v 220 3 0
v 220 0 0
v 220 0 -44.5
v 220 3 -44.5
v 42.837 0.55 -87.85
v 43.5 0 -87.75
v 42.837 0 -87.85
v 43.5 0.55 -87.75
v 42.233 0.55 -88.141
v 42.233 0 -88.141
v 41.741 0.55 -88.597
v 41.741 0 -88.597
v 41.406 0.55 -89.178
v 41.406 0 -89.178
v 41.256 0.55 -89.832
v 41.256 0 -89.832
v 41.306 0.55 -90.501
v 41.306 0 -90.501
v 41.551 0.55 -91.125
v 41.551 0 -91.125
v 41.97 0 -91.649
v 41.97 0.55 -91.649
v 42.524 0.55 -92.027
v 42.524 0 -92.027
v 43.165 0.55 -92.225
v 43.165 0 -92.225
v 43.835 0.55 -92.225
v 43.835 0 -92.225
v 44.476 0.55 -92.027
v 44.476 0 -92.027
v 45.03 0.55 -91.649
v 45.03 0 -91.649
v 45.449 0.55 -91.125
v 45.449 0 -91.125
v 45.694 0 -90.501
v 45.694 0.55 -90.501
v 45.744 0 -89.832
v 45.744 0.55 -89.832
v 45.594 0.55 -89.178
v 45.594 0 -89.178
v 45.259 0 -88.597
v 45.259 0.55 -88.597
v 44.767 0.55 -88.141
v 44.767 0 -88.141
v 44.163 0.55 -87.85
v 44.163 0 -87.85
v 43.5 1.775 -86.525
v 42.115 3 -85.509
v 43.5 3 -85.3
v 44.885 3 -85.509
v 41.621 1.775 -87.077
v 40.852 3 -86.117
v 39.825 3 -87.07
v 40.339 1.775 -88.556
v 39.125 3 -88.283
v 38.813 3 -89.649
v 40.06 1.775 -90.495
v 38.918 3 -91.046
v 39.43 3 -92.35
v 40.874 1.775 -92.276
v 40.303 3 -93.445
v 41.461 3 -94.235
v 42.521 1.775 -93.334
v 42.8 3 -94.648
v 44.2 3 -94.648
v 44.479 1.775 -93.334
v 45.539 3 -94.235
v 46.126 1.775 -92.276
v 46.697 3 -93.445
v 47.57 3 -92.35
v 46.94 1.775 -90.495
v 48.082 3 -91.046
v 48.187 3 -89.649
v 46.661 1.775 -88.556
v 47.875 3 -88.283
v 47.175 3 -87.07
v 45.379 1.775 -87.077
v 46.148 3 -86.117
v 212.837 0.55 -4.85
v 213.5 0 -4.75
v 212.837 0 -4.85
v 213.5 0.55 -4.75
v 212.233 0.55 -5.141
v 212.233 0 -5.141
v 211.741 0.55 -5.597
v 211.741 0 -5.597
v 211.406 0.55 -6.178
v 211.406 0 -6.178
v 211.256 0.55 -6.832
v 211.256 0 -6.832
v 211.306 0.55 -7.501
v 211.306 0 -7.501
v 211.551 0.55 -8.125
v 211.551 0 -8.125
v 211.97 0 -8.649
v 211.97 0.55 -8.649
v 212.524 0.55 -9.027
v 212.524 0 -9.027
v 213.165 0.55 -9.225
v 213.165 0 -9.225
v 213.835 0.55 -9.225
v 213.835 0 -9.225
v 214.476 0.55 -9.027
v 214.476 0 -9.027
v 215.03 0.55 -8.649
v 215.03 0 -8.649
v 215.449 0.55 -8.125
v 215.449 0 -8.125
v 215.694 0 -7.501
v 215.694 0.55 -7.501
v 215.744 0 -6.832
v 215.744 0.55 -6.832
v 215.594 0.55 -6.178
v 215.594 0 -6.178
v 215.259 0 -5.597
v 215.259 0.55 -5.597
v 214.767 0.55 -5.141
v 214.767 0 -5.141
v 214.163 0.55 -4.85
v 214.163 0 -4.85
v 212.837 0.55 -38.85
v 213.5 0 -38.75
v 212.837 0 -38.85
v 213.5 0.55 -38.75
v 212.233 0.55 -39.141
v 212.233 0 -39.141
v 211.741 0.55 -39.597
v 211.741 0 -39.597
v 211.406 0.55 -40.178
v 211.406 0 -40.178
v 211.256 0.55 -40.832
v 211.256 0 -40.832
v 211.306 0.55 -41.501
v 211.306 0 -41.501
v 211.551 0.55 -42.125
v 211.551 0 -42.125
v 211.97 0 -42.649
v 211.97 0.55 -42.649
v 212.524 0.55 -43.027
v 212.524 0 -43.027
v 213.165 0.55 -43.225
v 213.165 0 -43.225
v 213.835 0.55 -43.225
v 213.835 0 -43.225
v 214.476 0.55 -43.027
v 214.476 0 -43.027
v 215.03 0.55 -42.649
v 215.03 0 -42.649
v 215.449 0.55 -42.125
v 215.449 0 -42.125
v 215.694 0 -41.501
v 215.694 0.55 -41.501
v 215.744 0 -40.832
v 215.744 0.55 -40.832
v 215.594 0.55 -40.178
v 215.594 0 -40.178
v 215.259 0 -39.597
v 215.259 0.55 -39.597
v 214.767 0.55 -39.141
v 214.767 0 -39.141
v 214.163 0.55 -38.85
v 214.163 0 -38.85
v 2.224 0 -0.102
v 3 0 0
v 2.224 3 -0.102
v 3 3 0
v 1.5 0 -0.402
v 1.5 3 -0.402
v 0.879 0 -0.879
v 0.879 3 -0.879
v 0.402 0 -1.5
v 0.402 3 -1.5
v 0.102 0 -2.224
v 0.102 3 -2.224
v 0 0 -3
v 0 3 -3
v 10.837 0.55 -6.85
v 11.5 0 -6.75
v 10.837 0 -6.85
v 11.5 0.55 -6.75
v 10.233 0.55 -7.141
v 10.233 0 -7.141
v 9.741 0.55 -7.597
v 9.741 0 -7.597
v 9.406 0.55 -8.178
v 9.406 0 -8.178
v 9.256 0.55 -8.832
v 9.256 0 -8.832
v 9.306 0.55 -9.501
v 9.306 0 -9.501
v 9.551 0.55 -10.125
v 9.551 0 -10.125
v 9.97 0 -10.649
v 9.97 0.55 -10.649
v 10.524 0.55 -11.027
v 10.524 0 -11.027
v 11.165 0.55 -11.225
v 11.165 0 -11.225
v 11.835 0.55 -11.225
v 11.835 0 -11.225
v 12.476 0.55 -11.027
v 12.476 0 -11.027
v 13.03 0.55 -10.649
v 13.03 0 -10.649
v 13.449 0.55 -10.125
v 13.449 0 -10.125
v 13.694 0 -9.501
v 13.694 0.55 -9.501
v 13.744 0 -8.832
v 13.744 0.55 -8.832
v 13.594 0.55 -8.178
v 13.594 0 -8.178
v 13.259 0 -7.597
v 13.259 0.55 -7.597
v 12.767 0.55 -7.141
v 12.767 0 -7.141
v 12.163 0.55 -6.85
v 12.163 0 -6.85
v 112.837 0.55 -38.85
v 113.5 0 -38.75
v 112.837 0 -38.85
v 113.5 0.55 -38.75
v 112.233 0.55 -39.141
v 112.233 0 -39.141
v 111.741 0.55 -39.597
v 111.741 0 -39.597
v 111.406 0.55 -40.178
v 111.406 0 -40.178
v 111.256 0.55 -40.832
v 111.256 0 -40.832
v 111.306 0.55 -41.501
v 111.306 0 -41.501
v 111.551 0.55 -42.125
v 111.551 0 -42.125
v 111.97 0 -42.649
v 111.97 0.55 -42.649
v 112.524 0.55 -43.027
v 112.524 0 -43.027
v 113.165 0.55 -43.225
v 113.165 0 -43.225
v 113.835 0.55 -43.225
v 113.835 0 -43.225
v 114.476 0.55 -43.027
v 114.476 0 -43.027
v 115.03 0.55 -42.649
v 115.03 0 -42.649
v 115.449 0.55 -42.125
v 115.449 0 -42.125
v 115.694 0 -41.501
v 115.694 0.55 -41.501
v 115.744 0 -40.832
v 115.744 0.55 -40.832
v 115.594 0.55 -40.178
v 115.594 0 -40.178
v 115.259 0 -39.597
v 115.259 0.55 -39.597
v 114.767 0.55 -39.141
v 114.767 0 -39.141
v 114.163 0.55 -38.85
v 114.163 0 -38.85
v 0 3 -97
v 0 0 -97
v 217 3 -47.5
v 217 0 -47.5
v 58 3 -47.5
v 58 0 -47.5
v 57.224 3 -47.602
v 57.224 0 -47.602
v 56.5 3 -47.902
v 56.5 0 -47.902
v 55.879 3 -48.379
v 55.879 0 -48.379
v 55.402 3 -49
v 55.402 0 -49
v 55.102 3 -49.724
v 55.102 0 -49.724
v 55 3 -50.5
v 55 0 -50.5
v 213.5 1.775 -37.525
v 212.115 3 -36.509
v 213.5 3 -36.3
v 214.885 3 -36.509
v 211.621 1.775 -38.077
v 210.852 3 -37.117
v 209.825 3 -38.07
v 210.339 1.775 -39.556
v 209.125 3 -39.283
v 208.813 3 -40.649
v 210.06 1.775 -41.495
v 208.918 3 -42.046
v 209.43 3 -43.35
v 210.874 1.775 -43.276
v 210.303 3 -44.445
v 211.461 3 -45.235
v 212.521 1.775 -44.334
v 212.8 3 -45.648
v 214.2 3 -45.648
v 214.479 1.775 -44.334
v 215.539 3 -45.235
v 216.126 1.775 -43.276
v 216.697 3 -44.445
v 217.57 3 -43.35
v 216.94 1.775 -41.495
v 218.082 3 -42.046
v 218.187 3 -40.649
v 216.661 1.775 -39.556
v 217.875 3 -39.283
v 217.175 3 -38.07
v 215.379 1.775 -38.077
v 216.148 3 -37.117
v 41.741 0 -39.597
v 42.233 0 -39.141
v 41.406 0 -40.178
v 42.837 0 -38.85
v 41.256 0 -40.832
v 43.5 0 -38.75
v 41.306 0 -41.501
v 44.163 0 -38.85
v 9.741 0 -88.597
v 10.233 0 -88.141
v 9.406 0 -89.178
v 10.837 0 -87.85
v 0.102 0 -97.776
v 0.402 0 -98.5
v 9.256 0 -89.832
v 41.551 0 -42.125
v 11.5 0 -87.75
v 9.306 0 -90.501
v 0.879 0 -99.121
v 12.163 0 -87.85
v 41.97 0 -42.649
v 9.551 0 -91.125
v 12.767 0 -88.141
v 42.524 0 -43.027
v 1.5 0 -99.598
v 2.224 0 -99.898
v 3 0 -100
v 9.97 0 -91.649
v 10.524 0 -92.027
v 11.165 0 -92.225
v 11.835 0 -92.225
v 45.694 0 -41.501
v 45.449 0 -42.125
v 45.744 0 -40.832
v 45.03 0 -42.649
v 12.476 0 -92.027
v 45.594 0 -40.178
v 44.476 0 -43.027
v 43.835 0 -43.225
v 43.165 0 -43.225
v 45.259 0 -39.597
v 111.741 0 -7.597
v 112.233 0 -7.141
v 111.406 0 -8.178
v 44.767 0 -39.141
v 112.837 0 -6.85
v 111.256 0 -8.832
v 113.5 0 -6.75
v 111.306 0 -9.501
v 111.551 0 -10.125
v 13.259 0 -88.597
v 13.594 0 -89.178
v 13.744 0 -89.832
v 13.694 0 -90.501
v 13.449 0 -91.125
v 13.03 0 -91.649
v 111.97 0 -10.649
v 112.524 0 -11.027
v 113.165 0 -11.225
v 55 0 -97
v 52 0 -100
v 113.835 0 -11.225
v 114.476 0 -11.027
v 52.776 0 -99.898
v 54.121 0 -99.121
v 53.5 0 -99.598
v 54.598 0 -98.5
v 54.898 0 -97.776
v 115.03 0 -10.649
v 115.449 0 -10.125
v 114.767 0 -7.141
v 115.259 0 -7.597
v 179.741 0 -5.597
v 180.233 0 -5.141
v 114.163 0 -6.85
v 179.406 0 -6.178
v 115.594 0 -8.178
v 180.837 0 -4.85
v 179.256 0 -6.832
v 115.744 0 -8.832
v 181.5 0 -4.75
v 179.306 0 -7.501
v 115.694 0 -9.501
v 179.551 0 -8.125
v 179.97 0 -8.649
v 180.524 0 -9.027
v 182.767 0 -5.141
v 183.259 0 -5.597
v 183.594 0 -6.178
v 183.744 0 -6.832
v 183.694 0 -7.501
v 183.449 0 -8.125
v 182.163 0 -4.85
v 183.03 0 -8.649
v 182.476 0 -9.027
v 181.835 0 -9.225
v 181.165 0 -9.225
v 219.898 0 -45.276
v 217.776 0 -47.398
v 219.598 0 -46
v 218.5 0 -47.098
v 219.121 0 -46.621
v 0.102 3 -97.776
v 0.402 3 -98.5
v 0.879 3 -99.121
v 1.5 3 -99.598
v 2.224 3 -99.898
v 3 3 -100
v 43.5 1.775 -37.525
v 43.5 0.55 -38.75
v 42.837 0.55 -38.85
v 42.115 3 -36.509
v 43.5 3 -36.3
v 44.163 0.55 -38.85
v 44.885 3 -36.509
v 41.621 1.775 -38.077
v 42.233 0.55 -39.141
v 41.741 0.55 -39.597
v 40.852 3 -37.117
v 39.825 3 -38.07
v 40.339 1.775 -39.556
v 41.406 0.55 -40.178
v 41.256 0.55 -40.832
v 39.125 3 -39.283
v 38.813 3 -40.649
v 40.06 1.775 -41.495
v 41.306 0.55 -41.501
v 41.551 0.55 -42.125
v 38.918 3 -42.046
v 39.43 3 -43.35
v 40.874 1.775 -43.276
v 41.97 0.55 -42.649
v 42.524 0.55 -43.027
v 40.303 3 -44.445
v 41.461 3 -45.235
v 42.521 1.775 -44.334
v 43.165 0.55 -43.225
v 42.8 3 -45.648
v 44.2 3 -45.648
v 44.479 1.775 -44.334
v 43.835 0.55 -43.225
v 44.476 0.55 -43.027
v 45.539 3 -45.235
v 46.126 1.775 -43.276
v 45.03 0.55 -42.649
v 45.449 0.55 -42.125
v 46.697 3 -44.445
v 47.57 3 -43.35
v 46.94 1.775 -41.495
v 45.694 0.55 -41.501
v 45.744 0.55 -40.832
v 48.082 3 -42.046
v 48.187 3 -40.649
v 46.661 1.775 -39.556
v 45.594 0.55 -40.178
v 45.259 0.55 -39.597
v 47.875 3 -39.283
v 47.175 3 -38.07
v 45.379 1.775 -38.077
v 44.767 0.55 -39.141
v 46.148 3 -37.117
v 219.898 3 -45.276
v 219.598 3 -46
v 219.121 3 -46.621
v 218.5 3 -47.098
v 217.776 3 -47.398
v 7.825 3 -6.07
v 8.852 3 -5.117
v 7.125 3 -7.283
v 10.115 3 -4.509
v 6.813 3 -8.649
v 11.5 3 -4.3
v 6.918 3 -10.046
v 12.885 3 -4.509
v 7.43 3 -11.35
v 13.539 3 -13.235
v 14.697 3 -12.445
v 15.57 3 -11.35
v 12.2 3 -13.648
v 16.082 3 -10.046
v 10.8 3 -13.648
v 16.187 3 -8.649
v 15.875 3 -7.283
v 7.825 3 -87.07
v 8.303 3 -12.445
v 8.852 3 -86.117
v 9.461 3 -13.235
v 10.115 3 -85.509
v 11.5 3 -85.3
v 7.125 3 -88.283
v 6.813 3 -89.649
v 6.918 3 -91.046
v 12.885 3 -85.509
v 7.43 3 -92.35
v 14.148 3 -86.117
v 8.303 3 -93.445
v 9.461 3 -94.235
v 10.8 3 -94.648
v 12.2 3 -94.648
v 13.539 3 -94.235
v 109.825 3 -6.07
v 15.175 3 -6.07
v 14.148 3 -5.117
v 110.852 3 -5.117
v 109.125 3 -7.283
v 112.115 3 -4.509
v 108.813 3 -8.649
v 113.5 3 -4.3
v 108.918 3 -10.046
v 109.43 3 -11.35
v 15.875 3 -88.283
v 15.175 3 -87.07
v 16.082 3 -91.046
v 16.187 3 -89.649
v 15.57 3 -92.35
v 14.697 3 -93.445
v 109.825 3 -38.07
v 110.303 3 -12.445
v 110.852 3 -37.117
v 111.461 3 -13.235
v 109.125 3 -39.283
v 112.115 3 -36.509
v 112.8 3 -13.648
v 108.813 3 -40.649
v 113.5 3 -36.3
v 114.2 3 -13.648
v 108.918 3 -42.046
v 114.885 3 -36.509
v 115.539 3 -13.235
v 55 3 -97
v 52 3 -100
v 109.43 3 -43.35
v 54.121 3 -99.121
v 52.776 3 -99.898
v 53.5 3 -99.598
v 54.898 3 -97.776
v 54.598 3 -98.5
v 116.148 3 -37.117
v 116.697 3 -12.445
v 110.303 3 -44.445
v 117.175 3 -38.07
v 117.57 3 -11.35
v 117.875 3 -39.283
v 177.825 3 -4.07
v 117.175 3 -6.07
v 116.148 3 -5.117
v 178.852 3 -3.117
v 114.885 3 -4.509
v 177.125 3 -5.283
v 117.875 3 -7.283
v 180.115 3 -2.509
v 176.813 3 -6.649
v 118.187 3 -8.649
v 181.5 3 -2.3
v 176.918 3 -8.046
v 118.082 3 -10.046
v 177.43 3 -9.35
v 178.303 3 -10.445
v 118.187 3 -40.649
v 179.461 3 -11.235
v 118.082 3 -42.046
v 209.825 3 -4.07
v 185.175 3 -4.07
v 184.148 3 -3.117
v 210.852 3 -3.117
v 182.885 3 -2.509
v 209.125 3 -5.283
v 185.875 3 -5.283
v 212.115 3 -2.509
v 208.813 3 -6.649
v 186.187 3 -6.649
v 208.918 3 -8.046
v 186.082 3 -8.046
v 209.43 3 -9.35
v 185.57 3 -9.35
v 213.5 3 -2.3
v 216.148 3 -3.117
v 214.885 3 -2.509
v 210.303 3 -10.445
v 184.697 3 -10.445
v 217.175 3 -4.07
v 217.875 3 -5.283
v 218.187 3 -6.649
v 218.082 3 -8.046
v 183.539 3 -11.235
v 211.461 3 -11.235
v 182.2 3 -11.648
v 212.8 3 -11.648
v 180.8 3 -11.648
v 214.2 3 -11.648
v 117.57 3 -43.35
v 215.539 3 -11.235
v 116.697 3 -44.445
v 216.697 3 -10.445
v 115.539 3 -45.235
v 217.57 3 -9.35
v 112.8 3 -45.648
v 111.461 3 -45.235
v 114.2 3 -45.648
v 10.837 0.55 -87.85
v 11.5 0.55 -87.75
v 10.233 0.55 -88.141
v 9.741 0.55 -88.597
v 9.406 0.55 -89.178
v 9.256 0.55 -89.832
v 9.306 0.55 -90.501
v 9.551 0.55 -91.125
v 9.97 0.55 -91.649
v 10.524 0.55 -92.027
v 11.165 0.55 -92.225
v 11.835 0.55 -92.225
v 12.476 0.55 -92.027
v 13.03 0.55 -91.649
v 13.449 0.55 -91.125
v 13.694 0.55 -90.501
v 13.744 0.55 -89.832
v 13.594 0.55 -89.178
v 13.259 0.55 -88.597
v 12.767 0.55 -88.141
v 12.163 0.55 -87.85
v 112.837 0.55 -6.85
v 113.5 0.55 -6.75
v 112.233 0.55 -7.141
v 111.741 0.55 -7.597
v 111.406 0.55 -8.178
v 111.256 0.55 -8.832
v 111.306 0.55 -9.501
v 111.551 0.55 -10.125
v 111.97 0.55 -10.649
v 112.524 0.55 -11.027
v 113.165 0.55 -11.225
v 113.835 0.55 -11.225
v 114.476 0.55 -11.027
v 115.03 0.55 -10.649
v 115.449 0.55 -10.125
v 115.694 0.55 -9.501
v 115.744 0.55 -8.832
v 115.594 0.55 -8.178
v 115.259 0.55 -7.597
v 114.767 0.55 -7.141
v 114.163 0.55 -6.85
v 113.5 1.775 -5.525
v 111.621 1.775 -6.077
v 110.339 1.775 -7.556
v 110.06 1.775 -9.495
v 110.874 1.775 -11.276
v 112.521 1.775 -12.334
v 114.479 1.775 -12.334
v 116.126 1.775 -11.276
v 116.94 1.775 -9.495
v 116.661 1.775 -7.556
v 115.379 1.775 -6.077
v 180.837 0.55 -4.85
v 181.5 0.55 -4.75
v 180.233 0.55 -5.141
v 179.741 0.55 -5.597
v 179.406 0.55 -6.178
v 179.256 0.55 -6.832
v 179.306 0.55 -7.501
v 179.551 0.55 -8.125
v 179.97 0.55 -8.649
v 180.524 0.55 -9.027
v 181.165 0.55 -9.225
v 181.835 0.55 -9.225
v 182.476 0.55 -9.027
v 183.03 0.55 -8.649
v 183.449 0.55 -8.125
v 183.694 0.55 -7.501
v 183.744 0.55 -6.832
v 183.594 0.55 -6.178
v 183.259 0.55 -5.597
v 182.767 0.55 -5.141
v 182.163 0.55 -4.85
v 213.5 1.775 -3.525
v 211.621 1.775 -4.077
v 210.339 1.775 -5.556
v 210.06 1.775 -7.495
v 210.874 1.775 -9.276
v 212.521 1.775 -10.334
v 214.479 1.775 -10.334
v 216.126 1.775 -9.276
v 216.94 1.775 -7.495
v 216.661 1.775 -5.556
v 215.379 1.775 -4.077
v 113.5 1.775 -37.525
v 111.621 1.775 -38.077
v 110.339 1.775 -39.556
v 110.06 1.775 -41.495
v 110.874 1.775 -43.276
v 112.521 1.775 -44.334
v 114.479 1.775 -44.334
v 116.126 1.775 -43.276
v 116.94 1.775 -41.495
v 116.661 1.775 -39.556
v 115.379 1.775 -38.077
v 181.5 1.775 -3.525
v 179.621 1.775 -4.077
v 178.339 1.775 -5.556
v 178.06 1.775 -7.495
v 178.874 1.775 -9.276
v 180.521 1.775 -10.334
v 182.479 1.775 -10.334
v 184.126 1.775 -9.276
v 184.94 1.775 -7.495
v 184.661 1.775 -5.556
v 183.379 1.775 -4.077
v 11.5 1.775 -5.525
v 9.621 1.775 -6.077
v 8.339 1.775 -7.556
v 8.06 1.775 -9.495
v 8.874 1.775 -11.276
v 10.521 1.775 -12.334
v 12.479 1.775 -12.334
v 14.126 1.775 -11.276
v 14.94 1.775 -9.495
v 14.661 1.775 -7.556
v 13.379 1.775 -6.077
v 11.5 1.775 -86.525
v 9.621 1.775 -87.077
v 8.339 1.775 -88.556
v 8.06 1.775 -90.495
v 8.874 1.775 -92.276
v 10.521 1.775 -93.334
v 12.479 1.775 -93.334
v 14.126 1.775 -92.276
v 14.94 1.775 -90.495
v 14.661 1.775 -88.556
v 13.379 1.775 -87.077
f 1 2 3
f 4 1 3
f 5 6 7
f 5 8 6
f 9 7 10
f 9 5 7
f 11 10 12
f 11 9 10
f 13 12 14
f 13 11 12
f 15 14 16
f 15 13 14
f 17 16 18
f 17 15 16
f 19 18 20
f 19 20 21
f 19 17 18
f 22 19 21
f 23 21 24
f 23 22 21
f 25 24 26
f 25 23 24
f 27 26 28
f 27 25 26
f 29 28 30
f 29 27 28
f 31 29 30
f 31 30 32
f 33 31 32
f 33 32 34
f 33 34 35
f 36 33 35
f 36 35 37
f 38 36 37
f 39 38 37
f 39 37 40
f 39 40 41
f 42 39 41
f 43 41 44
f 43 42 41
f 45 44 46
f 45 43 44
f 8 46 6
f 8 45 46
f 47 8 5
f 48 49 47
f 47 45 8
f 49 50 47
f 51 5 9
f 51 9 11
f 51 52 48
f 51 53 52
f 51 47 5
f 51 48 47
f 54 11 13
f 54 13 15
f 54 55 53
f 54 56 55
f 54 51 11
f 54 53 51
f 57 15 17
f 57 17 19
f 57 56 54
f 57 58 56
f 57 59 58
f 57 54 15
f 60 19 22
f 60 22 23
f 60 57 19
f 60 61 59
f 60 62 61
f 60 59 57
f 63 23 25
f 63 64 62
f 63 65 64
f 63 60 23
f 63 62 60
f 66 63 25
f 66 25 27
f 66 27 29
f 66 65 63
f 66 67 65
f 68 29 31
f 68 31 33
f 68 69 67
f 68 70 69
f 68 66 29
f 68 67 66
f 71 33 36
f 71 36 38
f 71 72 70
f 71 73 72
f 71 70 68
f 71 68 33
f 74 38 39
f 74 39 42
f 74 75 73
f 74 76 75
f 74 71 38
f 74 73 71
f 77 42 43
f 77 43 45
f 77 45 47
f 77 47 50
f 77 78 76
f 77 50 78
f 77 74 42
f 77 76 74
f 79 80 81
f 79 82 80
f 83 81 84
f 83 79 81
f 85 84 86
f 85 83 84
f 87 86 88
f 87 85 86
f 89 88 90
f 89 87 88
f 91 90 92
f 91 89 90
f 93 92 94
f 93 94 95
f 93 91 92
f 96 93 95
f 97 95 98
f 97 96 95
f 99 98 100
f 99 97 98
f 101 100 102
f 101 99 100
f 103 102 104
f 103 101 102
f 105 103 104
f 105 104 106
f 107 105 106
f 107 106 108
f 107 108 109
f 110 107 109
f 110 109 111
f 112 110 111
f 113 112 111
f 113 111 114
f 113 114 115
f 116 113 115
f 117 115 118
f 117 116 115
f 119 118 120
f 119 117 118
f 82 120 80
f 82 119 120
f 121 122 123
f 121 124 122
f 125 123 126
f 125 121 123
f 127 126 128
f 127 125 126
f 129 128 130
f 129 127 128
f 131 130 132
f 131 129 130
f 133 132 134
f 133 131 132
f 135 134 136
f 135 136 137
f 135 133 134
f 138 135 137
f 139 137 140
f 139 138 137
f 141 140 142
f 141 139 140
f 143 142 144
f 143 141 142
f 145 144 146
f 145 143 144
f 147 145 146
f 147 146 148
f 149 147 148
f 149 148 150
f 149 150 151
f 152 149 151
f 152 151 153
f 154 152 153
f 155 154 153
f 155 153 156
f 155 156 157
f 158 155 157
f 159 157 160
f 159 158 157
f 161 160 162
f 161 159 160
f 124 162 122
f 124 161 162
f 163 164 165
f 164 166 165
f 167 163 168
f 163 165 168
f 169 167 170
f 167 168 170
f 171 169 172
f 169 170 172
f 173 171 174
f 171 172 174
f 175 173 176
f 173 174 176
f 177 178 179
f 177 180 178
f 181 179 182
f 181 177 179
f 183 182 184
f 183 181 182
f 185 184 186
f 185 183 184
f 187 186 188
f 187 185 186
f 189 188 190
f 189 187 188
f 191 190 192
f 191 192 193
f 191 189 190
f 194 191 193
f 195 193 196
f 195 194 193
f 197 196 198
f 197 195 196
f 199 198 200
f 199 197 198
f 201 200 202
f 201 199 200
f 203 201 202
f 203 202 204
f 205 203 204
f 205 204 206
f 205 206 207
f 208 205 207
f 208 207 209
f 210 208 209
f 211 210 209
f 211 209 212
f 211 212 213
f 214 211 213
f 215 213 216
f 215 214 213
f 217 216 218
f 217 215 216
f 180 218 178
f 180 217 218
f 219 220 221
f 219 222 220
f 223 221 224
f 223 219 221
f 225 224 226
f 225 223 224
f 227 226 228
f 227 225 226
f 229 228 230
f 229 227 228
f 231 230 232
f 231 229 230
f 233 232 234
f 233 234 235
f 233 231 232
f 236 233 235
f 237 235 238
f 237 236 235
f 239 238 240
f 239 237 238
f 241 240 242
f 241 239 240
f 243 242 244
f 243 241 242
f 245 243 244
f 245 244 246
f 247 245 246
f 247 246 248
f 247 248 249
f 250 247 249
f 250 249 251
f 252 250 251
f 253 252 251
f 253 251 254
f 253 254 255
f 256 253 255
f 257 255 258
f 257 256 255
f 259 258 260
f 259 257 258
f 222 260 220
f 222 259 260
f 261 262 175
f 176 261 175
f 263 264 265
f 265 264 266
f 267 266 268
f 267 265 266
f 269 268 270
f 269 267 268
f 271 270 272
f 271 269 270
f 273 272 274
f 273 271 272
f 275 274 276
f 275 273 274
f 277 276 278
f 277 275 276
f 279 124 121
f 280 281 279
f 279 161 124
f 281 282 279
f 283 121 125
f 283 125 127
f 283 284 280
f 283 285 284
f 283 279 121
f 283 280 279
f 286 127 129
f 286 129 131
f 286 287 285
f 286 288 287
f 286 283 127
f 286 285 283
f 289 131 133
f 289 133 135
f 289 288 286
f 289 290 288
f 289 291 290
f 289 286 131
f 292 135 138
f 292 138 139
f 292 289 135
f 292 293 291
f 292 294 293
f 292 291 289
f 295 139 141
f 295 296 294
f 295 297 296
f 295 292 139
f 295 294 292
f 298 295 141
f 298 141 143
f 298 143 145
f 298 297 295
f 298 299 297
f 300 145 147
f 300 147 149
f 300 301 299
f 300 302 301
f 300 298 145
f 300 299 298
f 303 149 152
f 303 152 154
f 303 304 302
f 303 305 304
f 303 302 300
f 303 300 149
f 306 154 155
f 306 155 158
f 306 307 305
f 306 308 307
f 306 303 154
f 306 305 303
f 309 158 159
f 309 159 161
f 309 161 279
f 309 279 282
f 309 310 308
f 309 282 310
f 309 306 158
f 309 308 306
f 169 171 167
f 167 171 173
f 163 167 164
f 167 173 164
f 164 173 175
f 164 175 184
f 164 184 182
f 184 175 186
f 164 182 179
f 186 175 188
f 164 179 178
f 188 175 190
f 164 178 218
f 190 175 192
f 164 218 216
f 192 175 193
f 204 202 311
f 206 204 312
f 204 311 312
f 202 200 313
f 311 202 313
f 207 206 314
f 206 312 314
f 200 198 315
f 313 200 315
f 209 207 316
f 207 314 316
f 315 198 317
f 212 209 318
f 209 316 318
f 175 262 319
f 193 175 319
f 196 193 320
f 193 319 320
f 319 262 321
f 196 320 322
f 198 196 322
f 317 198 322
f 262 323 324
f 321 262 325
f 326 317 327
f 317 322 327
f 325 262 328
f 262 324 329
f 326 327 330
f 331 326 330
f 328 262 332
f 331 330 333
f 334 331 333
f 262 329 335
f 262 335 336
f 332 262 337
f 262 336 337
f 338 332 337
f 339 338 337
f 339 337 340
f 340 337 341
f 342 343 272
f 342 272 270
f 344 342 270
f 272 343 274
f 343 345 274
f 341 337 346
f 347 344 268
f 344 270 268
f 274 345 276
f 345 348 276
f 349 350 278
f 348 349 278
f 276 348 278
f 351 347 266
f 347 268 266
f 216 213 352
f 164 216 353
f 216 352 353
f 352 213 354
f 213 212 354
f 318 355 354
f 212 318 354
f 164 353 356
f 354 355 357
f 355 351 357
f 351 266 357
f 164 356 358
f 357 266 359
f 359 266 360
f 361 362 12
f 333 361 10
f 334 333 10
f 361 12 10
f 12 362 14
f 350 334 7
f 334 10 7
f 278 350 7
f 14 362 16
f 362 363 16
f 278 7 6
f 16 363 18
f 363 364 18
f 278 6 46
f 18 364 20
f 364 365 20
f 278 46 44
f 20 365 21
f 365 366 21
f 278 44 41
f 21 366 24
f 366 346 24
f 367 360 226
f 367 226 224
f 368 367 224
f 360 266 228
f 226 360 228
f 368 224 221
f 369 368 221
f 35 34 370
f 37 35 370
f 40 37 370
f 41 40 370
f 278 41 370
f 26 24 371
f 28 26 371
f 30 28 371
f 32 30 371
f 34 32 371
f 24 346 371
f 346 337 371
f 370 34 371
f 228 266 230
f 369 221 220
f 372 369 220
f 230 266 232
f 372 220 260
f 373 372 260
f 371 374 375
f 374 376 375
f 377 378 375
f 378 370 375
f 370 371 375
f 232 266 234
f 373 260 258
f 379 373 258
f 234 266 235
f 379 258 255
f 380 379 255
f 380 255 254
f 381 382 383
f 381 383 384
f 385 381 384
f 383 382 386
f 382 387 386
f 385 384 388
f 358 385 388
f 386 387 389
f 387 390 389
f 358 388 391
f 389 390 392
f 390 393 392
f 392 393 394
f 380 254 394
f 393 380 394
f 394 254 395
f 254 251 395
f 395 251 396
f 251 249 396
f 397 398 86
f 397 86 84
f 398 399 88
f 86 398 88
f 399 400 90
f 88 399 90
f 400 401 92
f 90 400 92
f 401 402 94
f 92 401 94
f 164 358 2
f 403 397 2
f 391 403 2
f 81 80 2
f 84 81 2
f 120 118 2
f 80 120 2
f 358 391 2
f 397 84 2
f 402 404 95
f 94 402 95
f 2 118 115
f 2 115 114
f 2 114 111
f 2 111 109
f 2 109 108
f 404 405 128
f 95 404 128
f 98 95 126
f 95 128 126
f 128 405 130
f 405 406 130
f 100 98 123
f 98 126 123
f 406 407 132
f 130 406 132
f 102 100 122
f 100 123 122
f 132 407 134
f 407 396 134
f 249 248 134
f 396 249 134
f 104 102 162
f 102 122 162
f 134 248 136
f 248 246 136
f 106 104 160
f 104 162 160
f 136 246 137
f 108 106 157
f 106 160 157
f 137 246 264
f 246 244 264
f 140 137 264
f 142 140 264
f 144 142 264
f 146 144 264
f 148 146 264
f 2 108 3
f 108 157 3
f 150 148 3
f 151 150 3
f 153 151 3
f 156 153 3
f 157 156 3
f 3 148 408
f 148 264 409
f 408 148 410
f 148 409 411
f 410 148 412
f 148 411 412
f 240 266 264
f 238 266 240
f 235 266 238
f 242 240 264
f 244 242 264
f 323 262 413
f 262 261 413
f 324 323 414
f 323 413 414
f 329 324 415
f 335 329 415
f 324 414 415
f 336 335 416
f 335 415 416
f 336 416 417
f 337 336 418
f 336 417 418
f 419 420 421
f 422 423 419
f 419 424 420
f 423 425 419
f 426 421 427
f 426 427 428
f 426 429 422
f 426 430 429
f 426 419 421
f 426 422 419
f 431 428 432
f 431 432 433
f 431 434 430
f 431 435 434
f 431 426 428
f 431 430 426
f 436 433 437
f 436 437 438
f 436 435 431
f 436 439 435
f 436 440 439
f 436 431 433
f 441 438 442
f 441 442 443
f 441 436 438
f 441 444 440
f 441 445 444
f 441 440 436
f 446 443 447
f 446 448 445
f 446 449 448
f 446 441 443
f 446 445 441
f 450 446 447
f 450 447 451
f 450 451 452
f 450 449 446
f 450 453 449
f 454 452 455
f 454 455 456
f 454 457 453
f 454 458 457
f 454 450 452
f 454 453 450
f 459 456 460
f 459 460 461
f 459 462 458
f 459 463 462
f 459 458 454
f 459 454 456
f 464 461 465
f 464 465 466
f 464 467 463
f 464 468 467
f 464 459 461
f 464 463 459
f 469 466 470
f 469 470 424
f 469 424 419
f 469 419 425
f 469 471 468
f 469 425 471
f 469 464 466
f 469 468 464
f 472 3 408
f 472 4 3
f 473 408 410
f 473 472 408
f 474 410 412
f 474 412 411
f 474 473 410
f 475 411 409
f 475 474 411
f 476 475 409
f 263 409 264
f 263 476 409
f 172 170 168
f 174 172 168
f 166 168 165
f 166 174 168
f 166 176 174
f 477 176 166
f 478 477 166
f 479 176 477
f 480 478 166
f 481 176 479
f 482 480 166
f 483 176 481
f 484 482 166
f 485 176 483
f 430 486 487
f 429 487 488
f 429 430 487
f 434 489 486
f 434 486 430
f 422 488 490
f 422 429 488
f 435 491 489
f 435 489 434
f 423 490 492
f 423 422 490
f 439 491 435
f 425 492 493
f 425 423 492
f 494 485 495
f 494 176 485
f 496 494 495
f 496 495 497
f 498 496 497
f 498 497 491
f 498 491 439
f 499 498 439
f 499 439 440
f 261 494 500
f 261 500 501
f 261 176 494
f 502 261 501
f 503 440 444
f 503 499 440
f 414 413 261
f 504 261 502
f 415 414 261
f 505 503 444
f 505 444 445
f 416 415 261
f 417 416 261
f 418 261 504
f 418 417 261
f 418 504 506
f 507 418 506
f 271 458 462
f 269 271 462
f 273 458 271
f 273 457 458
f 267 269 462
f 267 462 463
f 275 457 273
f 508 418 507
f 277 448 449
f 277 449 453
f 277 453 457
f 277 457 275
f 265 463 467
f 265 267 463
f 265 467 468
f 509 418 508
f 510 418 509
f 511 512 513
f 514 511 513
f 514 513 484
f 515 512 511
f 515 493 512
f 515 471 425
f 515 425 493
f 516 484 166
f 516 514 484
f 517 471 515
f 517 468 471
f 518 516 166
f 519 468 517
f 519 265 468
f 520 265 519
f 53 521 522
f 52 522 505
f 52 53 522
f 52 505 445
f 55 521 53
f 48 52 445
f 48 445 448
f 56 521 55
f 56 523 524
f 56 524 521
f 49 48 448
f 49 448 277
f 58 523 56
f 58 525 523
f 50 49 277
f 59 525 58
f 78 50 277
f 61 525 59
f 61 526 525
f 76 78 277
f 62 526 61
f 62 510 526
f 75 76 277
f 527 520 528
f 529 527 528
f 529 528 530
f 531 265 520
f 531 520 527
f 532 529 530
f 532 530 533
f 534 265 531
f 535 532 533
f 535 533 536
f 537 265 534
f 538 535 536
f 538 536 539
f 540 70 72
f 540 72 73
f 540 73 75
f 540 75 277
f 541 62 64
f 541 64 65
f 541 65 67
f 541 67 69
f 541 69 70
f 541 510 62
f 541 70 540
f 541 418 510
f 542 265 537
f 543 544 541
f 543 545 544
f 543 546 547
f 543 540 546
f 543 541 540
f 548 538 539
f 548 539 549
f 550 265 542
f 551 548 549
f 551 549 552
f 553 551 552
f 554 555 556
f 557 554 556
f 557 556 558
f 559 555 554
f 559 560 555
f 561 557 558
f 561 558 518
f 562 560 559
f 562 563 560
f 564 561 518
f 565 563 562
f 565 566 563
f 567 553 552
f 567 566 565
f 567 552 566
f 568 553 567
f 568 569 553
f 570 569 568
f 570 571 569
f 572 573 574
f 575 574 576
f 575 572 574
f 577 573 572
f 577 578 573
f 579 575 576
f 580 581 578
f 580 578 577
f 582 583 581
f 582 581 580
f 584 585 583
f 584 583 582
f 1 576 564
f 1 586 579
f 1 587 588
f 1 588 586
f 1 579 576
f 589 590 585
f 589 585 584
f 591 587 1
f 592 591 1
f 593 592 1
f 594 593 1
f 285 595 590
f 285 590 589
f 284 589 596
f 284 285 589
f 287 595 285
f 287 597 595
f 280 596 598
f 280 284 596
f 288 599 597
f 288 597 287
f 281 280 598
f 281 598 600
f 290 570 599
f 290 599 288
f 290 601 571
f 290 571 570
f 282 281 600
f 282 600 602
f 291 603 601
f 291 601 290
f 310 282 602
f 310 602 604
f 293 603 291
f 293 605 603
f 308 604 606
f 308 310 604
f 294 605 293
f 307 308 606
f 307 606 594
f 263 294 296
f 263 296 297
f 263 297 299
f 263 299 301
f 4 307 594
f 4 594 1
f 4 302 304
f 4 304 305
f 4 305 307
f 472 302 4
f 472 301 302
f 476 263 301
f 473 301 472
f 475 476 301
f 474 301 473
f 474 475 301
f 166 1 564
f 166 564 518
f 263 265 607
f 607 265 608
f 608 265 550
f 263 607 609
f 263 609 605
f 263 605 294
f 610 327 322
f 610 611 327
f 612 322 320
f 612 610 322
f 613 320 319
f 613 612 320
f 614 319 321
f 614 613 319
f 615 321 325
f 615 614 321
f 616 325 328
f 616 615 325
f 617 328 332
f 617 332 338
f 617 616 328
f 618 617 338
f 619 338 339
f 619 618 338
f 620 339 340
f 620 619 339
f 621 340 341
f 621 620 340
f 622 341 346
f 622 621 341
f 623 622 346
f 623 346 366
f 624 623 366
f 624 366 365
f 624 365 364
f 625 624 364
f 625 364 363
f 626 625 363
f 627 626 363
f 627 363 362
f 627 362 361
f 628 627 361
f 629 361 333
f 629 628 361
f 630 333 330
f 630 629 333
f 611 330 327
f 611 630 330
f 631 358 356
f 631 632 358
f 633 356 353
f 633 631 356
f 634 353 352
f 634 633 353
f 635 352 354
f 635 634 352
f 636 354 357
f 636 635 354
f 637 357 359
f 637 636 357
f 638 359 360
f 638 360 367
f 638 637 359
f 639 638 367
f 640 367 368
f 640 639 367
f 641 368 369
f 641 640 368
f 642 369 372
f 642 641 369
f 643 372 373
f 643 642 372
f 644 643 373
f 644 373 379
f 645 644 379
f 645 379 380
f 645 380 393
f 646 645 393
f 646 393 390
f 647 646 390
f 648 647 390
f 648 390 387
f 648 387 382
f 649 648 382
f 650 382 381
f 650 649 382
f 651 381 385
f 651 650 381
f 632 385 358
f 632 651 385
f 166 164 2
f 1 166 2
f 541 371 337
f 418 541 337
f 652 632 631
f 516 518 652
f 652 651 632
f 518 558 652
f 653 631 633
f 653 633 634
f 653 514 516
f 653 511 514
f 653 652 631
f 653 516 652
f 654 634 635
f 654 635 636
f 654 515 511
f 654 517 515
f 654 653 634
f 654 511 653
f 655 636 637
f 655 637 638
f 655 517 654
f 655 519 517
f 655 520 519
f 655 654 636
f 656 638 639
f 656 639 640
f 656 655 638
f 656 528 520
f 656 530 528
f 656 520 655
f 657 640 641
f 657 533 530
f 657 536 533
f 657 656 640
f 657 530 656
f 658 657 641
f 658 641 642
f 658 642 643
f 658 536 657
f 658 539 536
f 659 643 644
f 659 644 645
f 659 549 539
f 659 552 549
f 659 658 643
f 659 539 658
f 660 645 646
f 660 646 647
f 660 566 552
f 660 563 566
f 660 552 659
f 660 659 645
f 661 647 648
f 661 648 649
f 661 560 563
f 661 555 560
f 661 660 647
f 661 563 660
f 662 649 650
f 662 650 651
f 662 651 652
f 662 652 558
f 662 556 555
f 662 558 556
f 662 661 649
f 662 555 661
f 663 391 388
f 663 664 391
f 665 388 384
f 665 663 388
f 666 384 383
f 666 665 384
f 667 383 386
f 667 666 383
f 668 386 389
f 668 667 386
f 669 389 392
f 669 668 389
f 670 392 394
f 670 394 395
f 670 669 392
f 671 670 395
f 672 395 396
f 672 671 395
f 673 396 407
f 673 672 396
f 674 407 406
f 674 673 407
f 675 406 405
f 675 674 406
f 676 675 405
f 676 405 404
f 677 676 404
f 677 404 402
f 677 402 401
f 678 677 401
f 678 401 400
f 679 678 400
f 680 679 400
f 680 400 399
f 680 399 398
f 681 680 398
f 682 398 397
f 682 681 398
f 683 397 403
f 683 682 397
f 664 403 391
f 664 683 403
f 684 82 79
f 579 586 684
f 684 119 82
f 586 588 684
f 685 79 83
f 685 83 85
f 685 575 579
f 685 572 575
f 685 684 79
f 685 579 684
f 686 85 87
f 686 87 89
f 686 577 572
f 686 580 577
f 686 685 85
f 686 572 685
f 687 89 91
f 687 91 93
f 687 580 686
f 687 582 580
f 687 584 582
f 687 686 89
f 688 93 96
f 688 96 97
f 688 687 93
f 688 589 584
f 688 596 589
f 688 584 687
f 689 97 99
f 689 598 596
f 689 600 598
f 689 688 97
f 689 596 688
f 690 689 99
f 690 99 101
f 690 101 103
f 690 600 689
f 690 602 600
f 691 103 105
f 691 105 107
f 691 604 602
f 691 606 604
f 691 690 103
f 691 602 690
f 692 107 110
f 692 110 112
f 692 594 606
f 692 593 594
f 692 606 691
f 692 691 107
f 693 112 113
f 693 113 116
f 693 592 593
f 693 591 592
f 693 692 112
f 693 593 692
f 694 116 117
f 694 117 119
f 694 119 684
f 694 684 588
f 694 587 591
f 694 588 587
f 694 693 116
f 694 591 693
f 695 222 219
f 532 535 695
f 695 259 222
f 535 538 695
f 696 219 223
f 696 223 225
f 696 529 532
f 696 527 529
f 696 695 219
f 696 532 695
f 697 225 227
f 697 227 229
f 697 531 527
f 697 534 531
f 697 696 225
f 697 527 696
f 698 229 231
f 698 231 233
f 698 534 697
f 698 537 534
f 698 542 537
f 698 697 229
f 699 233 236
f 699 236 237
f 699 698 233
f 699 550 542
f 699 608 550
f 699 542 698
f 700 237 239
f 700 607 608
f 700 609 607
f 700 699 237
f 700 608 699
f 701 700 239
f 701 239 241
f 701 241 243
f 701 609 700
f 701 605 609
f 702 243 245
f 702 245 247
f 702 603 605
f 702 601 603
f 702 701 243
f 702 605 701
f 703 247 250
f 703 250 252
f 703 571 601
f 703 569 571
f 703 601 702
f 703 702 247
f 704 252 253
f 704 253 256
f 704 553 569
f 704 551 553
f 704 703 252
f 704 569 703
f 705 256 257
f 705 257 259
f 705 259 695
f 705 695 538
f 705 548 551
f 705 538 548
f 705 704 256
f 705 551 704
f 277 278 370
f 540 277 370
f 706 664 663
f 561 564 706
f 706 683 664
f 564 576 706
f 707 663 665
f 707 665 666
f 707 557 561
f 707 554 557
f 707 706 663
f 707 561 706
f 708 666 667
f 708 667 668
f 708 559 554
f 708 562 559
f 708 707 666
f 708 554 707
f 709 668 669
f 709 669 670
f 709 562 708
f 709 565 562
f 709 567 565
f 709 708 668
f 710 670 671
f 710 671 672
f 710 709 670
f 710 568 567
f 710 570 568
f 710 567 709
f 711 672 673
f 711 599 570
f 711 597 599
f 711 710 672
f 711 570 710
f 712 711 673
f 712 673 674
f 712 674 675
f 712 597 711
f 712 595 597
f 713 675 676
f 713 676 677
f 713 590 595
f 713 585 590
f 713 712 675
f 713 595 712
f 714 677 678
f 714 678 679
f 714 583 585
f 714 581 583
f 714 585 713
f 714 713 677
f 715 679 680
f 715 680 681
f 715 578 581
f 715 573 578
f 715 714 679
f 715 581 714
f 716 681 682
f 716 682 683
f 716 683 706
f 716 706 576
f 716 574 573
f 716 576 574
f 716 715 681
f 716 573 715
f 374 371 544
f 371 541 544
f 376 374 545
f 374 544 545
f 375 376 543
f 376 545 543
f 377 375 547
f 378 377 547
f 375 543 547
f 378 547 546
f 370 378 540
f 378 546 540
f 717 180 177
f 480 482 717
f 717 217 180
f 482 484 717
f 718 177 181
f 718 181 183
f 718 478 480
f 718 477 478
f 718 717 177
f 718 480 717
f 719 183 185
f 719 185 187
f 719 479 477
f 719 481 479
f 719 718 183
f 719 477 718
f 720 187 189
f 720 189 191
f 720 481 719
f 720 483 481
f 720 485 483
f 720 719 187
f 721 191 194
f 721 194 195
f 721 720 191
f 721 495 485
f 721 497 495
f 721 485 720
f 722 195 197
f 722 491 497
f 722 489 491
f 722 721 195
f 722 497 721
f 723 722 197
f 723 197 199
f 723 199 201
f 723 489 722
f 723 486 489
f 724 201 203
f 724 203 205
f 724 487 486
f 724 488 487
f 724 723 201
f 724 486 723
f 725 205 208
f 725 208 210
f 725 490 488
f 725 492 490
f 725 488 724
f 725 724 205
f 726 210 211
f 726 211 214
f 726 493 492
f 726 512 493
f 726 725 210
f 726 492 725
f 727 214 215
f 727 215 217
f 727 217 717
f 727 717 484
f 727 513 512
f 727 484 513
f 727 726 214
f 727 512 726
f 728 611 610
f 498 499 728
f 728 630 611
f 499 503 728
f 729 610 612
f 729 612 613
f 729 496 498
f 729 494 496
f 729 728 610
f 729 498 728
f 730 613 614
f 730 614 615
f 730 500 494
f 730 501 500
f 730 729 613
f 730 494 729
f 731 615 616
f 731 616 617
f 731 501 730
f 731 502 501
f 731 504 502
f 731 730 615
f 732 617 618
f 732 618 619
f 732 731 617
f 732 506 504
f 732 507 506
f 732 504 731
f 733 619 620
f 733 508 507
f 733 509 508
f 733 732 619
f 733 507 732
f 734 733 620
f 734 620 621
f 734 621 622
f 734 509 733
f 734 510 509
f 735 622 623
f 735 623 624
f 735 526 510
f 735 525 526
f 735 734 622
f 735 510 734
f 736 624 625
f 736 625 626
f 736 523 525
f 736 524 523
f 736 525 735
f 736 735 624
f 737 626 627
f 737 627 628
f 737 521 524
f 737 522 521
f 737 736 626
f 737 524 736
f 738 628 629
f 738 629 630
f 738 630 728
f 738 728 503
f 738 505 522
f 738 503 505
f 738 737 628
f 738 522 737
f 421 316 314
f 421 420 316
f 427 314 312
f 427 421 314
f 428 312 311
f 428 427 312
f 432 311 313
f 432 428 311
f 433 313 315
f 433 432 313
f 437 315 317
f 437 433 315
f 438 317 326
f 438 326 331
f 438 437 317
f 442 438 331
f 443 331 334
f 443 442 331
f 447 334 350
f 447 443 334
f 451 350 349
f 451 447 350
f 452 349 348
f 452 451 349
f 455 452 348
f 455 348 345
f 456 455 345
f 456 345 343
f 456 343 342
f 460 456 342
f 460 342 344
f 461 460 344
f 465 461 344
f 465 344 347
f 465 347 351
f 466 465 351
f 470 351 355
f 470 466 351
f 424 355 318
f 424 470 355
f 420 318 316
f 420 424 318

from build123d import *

# Parameters (mm, degrees)
EXTRUDE1_DEPTH                               = 3
CSK_FOR_M4_COUNTERSUNK_FLAT_HEAD_SCR_2_COUNT = 2
CSK_FOR_M4_COUNTERSUNK_FLAT_HEAD_SCR_2_PITCH = 81
CSK_FOR_M4_COUNTERSUNK_FLAT_HEAD_SCR_3_COUNT = 2
CSK_FOR_M4_COUNTERSUNK_FLAT_HEAD_SCR_3_PITCH = 58.523499554
CSK_FOR_M4_COUNTERSUNK_FLAT_HEAD_SCR_4_COUNT = 2
CSK_FOR_M4_COUNTERSUNK_FLAT_HEAD_SCR_4_PITCH = 32
CSK_FOR_M4_COUNTERSUNK_FLAT_HEAD_SCR_5_COUNT = 2
CSK_FOR_M4_COUNTERSUNK_FLAT_HEAD_SCR_5_PITCH = 113.159179919
CSK_FOR_M4_COUNTERSUNK_FLAT_HEAD_SCR_6_COUNT = 2
CSK_FOR_M4_COUNTERSUNK_FLAT_HEAD_SCR_6_PITCH = 130.249760077
CSK_FOR_M4_COUNTERSUNK_FLAT_HEAD_SCR_7_COUNT = 2
CSK_FOR_M4_COUNTERSUNK_FLAT_HEAD_SCR_7_PITCH = 189.179808648
CSK_FOR_M4_COUNTERSUNK_FLAT_HEAD_SCR_8_COUNT = 2
CSK_FOR_M4_COUNTERSUNK_FLAT_HEAD_SCR_8_PITCH = 218.387270691
CSK_FOR_M4_COUNTERSUNK_FLAT_HEAD_SCR_9_COUNT = 2
CSK_FOR_M4_COUNTERSUNK_FLAT_HEAD_SCR_9_PITCH = 207.858124691
FILLET1_R                                    = 3


with BuildPart() as part:
    # Sketch1 → Extrude1 (new body)
    with BuildSketch(Plane(origin=(0, 0, 0), x_dir=(1, 0, 0), z_dir=(0, 1, 0))):
        Polygon((0, 0), (220, 0), (220, 47.5), (55, 47.5), (55, 100), (0, 100), align=None)
    extrude(amount=EXTRUDE1_DEPTH)

    # Sketch3 → CSK for M4 Countersunk Flat Head Screw1 (revolve, cut)
    with BuildSketch(Plane(origin=(11.5, 3, -90), x_dir=(0, 0, 1), z_dir=(1, 0, 0))):
        Polygon((0, 0), (0, 3), (2.25, 3), (2.25, 2.45), (4.7, 0), align=None)
    csk_for_m4_countersunk_flat_head_screw1 = revolve(axis=Axis((11.5, 9.35, -90), (0, -1, 0)), mode=Mode.SUBTRACT)

    # CSK for M4 Countersunk Flat Head Scr 2: CSK for M4 Countersunk Flat Head Screw1 ×2
    with Locations(*[(0, 0, i * CSK_FOR_M4_COUNTERSUNK_FLAT_HEAD_SCR_2_PITCH) for i in range(1, CSK_FOR_M4_COUNTERSUNK_FLAT_HEAD_SCR_2_COUNT)]):
        add(csk_for_m4_countersunk_flat_head_screw1, mode=Mode.SUBTRACT)

    # CSK for M4 Countersunk Flat Head Scr 3: CSK for M4 Countersunk Flat Head Screw1 ×2
    with Locations(*[Vector(0.546788901, 0, 0.837270505) * (i * CSK_FOR_M4_COUNTERSUNK_FLAT_HEAD_SCR_3_PITCH) for i in range(1, CSK_FOR_M4_COUNTERSUNK_FLAT_HEAD_SCR_3_COUNT)]):
        add(csk_for_m4_countersunk_flat_head_screw1, mode=Mode.SUBTRACT)

    # CSK for M4 Countersunk Flat Head Scr 4: CSK for M4 Countersunk Flat Head Screw1 ×2
    with Locations(*[(i * CSK_FOR_M4_COUNTERSUNK_FLAT_HEAD_SCR_4_PITCH, 0, 0) for i in range(1, CSK_FOR_M4_COUNTERSUNK_FLAT_HEAD_SCR_4_COUNT)]):
        add(csk_for_m4_countersunk_flat_head_screw1, mode=Mode.SUBTRACT)

    # CSK for M4 Countersunk Flat Head Scr 5: CSK for M4 Countersunk Flat Head Screw1 ×2
    with Locations(*[Vector(0.901385111, 0, 0.433018338) * (i * CSK_FOR_M4_COUNTERSUNK_FLAT_HEAD_SCR_5_PITCH) for i in range(1, CSK_FOR_M4_COUNTERSUNK_FLAT_HEAD_SCR_5_COUNT)]):
        add(csk_for_m4_countersunk_flat_head_screw1, mode=Mode.SUBTRACT)

    # CSK for M4 Countersunk Flat Head Scr 6: CSK for M4 Countersunk Flat Head Screw1 ×2
    with Locations(*[Vector(0.783110847, 0, 0.621882144) * (i * CSK_FOR_M4_COUNTERSUNK_FLAT_HEAD_SCR_6_PITCH) for i in range(1, CSK_FOR_M4_COUNTERSUNK_FLAT_HEAD_SCR_6_COUNT)]):
        add(csk_for_m4_countersunk_flat_head_screw1, mode=Mode.SUBTRACT)

    # CSK for M4 Countersunk Flat Head Scr 7: CSK for M4 Countersunk Flat Head Screw1 ×2
    with Locations(*[Vector(0.898615985, 0, 0.43873604) * (i * CSK_FOR_M4_COUNTERSUNK_FLAT_HEAD_SCR_7_PITCH) for i in range(1, CSK_FOR_M4_COUNTERSUNK_FLAT_HEAD_SCR_7_COUNT)]):
        add(csk_for_m4_countersunk_flat_head_screw1, mode=Mode.SUBTRACT)

    # CSK for M4 Countersunk Flat Head Scr 8: CSK for M4 Countersunk Flat Head Screw1 ×2
    with Locations(*[Vector(0.924962336, 0, 0.380058782) * (i * CSK_FOR_M4_COUNTERSUNK_FLAT_HEAD_SCR_8_PITCH) for i in range(1, CSK_FOR_M4_COUNTERSUNK_FLAT_HEAD_SCR_8_COUNT)]):
        add(csk_for_m4_countersunk_flat_head_screw1, mode=Mode.SUBTRACT)

    # CSK for M4 Countersunk Flat Head Scr 9: CSK for M4 Countersunk Flat Head Screw1 ×2
    with Locations(*[Vector(0.971816715, 0, 0.235737718) * (i * CSK_FOR_M4_COUNTERSUNK_FLAT_HEAD_SCR_9_PITCH) for i in range(1, CSK_FOR_M4_COUNTERSUNK_FLAT_HEAD_SCR_9_COUNT)]):
        add(csk_for_m4_countersunk_flat_head_screw1, mode=Mode.SUBTRACT)

    # Fillet1
    fillet1_edges = [part.edges().sort_by_distance(p)[0] for p in [
        (0, 1.5, -100),
        (55, 1.5, -100),
        (55, 1.5, -47.5),
        (220, 1.5, -47.5),
        (0, 1.5, 0),
    ]]
    fillet(fillet1_edges, radius=FILLET1_R)


solid = part.part
